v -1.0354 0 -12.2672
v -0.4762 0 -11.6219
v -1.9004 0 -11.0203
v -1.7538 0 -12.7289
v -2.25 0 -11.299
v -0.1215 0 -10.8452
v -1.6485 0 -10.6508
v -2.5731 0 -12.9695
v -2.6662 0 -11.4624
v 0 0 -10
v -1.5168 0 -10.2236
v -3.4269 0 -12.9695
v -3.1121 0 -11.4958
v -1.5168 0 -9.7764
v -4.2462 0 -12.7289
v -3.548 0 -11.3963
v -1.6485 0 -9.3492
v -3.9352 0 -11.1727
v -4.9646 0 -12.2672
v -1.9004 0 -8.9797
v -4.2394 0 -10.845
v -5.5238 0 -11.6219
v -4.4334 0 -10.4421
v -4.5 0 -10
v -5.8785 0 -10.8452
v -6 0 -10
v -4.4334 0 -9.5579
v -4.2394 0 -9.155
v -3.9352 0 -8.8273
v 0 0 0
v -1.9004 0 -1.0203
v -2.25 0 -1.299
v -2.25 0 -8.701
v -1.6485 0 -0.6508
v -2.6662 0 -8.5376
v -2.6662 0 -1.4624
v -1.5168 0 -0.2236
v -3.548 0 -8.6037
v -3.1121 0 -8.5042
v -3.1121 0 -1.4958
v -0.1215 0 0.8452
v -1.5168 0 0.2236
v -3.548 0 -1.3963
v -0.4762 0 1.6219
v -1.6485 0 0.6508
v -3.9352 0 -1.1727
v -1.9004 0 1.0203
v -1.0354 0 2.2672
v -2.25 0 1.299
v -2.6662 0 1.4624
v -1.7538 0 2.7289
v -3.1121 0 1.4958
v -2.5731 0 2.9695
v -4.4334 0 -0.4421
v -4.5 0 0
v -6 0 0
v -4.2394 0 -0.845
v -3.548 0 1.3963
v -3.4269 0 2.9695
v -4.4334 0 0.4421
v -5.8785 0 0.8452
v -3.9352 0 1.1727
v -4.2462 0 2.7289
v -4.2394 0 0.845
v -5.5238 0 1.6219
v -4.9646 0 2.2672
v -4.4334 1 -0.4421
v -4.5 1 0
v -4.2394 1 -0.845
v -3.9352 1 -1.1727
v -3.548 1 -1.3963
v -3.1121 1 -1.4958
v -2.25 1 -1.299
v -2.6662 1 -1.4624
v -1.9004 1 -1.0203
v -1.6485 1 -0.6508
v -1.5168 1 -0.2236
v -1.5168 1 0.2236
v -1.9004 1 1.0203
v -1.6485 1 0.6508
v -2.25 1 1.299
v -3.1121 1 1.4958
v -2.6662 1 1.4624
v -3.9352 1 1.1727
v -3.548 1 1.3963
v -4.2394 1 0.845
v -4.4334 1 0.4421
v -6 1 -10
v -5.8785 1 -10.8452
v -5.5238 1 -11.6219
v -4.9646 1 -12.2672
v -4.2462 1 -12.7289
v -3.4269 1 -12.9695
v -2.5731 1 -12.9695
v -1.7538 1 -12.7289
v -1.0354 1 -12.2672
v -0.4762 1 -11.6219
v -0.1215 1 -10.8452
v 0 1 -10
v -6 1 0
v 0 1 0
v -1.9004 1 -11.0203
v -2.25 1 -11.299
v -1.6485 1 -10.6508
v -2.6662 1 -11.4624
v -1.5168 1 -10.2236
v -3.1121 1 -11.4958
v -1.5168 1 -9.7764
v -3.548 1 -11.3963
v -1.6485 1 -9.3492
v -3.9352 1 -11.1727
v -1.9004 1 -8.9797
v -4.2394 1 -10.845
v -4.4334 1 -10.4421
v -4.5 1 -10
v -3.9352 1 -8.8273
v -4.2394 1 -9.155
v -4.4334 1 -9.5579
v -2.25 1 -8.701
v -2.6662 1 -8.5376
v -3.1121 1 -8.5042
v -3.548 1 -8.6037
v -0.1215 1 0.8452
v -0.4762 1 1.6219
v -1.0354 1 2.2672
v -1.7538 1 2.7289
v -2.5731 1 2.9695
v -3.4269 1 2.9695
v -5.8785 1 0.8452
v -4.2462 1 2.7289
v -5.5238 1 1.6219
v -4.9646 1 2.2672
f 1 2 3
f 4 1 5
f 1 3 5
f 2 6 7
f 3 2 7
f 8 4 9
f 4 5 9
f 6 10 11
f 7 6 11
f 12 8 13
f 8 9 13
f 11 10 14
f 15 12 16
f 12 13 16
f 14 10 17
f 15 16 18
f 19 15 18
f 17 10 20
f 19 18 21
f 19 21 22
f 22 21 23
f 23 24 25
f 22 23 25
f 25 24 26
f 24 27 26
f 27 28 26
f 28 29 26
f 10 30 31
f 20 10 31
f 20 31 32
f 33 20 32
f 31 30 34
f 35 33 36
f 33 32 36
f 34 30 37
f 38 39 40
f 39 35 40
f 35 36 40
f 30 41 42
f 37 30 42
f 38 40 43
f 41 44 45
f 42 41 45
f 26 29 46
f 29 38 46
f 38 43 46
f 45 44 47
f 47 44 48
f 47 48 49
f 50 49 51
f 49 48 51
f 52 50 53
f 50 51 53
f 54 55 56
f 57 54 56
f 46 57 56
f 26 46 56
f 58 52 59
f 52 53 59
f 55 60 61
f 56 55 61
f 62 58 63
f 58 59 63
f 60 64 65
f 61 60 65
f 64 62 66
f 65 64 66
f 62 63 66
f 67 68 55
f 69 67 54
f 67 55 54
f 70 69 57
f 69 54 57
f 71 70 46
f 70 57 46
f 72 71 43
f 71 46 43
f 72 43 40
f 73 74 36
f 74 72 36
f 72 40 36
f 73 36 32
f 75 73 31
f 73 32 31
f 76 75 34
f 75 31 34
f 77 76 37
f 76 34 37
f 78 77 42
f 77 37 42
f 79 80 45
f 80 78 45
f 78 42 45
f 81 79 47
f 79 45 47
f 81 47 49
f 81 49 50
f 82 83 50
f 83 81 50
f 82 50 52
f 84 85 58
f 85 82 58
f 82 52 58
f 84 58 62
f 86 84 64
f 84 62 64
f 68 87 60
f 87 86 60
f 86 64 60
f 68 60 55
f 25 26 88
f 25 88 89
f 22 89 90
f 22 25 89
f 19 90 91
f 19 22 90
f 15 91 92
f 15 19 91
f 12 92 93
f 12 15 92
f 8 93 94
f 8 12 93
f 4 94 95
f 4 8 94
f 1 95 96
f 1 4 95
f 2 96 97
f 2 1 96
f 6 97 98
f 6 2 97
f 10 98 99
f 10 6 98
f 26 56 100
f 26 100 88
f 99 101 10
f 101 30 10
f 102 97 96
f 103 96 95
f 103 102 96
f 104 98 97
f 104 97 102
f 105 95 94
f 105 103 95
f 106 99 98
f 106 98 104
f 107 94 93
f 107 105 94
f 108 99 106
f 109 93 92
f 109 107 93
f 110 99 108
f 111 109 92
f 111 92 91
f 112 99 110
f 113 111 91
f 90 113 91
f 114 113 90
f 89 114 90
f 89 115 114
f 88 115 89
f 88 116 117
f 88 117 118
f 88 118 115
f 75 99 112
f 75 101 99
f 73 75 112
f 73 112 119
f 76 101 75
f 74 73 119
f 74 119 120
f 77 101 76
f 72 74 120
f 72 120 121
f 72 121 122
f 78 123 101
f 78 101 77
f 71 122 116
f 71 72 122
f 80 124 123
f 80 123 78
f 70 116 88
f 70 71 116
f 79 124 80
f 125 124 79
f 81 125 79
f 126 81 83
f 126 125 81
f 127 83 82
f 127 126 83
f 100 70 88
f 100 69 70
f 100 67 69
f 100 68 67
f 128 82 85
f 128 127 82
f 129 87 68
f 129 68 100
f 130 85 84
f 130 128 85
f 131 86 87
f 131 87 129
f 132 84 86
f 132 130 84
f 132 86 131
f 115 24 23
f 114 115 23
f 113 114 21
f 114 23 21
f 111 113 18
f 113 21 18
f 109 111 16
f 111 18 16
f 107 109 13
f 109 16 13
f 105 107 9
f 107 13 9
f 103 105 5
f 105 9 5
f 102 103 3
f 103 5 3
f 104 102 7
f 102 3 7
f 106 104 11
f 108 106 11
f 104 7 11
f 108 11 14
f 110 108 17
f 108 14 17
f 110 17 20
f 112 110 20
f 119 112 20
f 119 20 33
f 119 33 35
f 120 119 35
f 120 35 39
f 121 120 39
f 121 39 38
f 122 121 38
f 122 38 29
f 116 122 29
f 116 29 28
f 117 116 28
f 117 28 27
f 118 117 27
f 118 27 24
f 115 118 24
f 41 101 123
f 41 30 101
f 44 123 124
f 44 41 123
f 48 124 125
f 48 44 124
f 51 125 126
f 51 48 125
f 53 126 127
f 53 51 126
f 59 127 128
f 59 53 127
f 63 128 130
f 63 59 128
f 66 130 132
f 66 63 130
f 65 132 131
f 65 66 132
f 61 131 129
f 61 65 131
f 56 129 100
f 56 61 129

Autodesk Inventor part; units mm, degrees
ref_plane "YZ Plane" through (0, 0, 0) normal (1, 0, 0) x (0, 1, 0)
ref_plane "XZ Plane" through (0, 0, 0) normal (0, 1, 0) x (-1, 0, 0)
ref_plane "XY Plane" through (0, 0, 0) normal (0, 0, 1) x (1, 0, 0)
sketch "Sketch2" plane through (0, 0, 0) normal (0, 1, 0) x (-1, 0, 0)
  line L0 (0, 0) -> (6, 0)
  line L1 (6, 0) -> (0, 0)
  line L2 (0, -10) -> (6, -10)
  line L3 (3, 0) -> (8, 0)
  line L4 (8, -10) -> (3, -10)
  line L5 (3, -10) -> (-2, -10)
  line L6 (-2, 0) -> (3, 0)
  circle A0 centre (3, 0) radius 1.5
  circle A1 centre (3, 0) radius 3
  circle A2 centre (3, -10) radius 1.5
  circle A3 centre (3, -10) radius 3
  line L7 (0, 0) -> (0, -10)
  line L8 (6, 0) -> (6, -10)
  dimension "d24" = 10
  dimension "d30" = 5
  dimension "d31" = 5
  dimension "d32" = 3
  dimension "d33" = 6
  dimension "d34" = 3
  dimension "d35" = 6
extrude "Extrusion4" add sketch "Sketch2" along normal blind 1 contours A0 L0 A1 | L0 A1 A0 | L8 A3 L7 A1 | A3 L2 A2 | L2 A2 A3
thread "Thread1" size "M3x0.5" class "6H" standard "ANSI Metric M Profile" length 1
thread "Thread2" size "M3x0.5" class "6H" standard "ANSI Metric M Profile" length 1
properties part number "linkToActuator4"
